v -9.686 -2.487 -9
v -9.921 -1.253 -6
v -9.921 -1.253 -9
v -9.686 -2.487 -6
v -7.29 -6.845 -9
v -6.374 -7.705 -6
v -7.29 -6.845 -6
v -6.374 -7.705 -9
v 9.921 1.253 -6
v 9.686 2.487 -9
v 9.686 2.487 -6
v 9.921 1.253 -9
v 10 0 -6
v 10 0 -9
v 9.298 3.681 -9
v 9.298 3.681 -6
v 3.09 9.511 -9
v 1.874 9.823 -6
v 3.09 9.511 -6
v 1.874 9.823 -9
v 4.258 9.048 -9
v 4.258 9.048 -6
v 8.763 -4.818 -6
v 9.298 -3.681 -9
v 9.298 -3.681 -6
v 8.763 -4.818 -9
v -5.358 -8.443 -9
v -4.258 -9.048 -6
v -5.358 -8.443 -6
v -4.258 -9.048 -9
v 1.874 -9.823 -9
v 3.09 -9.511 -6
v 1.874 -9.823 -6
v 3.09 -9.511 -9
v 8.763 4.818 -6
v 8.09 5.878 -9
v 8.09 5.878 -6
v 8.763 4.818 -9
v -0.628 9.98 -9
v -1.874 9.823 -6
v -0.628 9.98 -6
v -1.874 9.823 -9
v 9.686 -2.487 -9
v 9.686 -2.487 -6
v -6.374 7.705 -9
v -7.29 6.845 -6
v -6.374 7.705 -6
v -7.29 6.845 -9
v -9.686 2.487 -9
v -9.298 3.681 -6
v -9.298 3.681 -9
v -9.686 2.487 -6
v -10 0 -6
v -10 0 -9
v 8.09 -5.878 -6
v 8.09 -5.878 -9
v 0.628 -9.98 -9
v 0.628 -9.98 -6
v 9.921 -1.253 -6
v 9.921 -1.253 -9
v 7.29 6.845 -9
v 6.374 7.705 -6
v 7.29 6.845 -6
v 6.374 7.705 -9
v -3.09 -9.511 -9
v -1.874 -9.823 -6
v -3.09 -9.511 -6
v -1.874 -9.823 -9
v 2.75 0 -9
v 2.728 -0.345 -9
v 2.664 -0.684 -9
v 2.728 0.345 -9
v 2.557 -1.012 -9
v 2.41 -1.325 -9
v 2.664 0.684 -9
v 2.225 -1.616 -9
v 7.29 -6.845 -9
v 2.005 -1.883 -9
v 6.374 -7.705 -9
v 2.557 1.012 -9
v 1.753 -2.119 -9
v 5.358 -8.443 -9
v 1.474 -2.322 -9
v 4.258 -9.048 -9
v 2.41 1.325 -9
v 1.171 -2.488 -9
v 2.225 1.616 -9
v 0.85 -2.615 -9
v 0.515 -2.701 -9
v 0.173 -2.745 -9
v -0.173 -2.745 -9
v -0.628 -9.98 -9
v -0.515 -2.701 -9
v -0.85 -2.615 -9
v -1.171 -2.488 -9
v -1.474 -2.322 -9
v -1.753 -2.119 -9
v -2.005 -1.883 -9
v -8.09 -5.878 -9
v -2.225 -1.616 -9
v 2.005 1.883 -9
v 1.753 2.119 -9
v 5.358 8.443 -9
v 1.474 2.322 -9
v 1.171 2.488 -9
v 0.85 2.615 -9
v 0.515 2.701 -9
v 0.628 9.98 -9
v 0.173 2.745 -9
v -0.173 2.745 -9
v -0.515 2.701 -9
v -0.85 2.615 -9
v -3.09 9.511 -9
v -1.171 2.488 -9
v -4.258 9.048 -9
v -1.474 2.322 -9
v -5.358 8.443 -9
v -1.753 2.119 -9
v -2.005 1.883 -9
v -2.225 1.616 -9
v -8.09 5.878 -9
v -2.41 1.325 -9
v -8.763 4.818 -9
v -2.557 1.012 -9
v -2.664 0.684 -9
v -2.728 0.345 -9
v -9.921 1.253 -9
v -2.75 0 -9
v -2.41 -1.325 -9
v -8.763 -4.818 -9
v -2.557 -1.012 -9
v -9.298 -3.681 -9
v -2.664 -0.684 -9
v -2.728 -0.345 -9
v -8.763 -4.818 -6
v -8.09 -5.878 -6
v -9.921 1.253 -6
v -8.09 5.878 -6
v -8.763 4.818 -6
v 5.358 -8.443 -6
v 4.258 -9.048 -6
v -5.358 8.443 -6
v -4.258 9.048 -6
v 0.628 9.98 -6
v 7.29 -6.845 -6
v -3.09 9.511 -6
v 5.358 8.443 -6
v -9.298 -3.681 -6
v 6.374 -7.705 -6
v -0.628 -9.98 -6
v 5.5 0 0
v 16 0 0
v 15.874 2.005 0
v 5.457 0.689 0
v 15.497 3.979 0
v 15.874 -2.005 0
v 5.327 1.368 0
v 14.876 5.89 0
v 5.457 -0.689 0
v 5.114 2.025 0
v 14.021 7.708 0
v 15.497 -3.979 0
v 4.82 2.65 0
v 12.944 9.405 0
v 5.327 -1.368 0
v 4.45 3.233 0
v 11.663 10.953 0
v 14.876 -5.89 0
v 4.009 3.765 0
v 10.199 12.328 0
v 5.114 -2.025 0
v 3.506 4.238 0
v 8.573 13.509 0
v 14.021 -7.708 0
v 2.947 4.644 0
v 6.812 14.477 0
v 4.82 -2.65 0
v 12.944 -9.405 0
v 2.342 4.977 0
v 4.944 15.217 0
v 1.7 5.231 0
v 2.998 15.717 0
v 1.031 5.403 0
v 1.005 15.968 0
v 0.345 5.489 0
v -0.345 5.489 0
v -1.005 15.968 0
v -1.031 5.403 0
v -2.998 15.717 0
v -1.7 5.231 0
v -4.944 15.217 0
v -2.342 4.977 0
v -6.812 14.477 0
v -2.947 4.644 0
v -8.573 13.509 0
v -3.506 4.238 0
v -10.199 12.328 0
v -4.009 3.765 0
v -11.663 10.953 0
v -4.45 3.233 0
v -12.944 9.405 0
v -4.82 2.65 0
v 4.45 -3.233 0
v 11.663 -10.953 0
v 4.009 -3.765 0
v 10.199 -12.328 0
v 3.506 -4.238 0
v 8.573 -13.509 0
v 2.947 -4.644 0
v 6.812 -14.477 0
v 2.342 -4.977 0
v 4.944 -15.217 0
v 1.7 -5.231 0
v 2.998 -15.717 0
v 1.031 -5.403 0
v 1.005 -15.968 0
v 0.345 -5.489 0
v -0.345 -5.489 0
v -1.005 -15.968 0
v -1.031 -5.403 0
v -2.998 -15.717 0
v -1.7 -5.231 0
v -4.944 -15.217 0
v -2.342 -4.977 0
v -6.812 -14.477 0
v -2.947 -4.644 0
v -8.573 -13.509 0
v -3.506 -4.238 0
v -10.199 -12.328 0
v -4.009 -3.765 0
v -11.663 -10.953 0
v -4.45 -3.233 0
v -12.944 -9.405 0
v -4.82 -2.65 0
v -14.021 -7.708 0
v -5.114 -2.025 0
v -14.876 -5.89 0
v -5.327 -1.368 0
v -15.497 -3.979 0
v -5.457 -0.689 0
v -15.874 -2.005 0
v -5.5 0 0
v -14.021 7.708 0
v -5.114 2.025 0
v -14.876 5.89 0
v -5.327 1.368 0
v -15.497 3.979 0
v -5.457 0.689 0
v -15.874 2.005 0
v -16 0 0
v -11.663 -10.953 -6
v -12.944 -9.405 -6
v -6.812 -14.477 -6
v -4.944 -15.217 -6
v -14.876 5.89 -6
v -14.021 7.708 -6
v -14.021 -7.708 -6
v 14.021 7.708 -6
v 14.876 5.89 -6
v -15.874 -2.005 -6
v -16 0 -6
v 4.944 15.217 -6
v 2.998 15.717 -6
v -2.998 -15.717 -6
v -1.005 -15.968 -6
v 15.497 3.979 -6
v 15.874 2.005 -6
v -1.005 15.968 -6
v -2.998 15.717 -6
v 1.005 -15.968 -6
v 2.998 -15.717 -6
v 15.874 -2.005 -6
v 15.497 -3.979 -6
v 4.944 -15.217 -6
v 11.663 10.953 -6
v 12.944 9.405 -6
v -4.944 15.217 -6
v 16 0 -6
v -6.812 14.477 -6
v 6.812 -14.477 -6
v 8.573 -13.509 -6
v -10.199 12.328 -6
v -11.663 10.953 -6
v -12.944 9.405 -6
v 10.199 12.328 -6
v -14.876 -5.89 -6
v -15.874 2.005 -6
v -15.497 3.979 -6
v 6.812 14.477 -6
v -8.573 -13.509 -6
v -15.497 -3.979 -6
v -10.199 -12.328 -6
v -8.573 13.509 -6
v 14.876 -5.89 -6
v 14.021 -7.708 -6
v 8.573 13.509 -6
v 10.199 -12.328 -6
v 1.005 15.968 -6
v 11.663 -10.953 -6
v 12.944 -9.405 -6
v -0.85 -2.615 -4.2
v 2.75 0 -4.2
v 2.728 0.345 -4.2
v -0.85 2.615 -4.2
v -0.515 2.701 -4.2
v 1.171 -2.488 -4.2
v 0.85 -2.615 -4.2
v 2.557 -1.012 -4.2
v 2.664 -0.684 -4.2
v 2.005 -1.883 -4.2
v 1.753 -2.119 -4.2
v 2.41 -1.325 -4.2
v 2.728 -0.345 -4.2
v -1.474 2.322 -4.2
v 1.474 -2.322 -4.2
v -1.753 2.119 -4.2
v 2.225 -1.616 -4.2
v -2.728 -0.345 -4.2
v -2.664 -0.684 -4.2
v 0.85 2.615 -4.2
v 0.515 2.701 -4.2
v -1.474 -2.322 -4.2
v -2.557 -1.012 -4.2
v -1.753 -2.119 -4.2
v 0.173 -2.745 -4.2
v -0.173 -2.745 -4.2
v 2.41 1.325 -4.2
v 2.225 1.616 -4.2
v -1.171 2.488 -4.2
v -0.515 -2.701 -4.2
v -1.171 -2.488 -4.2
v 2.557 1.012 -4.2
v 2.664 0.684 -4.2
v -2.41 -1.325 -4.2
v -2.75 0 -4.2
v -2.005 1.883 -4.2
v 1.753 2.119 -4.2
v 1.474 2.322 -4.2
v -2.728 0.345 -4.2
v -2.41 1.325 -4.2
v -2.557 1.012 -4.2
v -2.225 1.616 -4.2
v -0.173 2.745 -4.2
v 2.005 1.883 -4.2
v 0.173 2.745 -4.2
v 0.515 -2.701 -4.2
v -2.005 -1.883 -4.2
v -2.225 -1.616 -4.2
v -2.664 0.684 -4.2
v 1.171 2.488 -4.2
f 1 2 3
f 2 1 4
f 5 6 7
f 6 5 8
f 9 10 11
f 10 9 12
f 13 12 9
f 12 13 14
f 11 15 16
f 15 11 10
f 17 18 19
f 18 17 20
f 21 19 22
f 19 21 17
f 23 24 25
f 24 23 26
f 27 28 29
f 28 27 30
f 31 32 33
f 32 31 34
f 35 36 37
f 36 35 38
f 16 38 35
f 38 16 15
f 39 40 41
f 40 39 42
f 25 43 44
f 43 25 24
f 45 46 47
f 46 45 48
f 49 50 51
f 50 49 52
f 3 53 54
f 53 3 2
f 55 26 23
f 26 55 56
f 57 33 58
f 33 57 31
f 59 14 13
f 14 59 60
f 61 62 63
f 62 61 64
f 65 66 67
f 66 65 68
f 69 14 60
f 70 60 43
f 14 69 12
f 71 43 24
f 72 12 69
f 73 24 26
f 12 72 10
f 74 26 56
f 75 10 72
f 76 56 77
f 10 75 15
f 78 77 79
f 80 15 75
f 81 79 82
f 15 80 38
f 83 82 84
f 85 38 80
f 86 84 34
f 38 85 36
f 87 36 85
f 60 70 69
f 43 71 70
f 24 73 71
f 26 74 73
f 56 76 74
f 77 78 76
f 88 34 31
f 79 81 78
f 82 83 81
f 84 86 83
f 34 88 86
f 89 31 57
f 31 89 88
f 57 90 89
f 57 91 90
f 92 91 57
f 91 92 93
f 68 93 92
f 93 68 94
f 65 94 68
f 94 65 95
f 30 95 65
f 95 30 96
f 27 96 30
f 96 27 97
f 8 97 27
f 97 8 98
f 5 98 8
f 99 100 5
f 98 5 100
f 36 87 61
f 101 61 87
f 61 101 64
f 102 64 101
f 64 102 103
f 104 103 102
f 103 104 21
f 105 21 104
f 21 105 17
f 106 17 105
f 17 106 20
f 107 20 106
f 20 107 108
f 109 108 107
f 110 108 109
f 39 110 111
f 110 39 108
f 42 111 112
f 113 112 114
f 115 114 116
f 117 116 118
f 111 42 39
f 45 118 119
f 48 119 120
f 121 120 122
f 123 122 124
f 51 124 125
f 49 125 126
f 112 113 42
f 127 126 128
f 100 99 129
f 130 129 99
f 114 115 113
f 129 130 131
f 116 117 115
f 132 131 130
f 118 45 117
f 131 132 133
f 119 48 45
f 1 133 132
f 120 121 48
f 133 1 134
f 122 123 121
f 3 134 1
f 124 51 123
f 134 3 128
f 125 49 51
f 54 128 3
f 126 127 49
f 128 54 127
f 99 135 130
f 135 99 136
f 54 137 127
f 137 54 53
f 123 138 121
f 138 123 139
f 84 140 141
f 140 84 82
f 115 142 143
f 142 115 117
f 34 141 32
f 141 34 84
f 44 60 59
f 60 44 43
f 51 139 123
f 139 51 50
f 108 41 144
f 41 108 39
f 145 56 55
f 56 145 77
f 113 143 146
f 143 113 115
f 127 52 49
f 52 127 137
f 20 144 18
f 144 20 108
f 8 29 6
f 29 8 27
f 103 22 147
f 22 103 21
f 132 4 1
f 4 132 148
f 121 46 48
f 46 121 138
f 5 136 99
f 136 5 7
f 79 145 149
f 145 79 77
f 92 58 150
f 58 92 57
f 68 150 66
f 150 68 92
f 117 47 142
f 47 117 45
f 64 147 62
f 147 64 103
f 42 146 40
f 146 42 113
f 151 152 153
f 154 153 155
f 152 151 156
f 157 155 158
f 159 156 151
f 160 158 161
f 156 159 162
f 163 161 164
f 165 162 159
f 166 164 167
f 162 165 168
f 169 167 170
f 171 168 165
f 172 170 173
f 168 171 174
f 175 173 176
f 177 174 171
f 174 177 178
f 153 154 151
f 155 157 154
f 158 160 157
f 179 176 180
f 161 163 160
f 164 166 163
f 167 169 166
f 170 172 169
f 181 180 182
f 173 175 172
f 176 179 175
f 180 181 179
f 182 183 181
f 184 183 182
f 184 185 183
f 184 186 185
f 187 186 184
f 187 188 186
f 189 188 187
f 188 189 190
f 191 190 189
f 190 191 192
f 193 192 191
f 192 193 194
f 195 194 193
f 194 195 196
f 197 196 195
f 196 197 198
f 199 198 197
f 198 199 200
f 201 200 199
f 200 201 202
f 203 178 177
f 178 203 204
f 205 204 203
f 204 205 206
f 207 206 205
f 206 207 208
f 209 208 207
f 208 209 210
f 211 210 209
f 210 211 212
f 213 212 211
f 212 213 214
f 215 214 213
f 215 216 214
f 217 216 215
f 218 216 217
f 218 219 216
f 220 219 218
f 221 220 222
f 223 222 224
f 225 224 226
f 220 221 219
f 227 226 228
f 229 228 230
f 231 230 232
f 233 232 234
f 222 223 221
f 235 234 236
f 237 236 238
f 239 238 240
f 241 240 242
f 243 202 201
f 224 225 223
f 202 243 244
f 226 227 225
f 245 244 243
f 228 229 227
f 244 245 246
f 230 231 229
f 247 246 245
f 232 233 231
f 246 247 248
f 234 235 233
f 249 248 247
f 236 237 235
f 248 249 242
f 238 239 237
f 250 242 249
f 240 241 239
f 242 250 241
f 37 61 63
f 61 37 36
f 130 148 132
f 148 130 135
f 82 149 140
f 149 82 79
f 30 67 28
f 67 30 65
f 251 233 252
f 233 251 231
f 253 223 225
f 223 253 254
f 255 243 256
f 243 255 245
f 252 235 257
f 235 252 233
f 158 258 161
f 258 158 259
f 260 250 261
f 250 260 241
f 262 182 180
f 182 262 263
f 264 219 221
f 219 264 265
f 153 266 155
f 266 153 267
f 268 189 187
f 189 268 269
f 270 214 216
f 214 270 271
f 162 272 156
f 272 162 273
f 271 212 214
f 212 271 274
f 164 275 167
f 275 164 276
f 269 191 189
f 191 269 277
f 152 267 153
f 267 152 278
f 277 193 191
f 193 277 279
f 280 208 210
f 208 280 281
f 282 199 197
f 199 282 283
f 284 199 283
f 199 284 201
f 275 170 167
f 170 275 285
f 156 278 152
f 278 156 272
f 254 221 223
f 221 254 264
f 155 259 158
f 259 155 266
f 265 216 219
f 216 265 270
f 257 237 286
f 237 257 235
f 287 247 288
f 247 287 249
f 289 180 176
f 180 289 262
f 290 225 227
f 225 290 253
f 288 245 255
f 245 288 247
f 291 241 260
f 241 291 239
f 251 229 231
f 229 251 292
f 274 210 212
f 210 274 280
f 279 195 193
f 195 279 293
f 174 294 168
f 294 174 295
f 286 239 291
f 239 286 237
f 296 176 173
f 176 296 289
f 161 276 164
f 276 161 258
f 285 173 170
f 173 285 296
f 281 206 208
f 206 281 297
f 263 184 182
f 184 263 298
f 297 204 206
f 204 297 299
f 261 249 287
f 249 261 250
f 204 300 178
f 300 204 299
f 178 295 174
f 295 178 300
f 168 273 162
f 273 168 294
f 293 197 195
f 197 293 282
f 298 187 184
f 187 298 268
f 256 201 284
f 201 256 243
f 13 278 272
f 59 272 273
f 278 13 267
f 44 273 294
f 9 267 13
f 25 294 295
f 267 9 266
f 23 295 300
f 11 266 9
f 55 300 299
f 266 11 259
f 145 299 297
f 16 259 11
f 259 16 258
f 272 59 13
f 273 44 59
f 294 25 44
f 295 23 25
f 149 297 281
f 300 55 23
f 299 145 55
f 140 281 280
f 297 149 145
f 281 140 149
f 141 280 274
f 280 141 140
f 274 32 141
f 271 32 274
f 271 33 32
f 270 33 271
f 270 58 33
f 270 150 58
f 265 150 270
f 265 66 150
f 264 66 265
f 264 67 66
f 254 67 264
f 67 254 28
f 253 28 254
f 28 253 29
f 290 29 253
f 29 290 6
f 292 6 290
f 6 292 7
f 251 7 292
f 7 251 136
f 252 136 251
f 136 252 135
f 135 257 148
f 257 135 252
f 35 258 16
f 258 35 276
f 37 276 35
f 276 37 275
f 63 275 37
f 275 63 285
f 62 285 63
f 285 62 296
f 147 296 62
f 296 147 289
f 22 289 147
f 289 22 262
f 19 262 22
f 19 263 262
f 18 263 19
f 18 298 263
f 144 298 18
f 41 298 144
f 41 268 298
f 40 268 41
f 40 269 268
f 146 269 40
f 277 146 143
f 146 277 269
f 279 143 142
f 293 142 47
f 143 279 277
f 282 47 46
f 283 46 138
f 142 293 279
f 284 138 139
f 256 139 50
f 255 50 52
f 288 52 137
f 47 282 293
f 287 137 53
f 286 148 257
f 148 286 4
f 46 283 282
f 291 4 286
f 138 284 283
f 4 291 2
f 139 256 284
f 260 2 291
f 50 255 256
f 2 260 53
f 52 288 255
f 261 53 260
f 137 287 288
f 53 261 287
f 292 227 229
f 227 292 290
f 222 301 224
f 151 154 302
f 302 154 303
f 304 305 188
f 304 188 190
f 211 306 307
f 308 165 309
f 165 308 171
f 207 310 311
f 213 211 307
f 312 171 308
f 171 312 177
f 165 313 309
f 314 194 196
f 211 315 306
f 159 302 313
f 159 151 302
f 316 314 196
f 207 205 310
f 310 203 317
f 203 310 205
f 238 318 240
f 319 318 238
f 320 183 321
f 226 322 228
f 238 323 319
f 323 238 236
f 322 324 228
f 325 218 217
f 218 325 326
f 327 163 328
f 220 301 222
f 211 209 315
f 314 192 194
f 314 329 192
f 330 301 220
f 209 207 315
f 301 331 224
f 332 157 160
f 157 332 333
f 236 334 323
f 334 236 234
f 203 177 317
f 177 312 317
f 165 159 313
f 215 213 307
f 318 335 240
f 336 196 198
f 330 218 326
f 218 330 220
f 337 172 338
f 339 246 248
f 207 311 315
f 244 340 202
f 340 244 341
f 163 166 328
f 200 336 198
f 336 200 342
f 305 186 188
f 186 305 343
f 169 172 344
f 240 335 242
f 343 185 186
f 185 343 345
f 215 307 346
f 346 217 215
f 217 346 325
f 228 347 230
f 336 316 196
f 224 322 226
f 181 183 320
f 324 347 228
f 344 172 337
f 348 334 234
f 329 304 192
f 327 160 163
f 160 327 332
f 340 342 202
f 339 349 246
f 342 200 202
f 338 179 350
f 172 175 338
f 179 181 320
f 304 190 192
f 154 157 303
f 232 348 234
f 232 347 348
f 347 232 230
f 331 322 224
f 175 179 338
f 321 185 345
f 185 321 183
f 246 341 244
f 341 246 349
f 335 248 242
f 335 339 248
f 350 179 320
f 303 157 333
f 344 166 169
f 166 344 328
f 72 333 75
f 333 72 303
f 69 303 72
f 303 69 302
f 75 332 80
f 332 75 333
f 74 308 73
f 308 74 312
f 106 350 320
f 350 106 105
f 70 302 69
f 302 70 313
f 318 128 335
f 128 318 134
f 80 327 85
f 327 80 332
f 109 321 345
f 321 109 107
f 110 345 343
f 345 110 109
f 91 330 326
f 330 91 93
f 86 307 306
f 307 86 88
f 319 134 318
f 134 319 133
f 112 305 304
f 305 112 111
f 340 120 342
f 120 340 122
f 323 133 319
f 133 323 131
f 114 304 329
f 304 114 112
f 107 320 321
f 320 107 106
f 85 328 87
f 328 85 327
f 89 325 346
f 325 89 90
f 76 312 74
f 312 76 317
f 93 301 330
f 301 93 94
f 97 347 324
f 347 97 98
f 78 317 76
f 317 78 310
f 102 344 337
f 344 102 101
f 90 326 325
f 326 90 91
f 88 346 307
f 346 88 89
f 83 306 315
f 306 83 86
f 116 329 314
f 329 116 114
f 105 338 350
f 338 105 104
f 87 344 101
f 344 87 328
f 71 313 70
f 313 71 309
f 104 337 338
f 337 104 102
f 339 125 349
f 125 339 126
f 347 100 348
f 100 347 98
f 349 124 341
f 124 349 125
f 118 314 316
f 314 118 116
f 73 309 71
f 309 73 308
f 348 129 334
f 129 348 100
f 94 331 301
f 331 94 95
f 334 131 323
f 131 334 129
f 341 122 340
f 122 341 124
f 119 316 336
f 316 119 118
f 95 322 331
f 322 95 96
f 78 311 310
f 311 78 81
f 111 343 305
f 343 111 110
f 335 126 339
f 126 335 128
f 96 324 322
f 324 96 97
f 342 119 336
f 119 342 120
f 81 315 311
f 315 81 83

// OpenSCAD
$fn = 50;


difference() {
	union() {
		translate(v = [0, 0, -9.0000000000]) {
			cylinder(h = 9, r = 10.0000000000);
		}
		translate(v = [0, 0, -6.0000000000]) {
			cylinder(h = 6, r = 16.0000000000);
		}
	}
	union() {
		translate(v = [0, 0, 0]) {
			rotate(a = [0, 0, 0]) {
				difference() {
					union() {
						#translate(v = [0, 0, -9.0000000000]) {
							cylinder(h = 9, r = 2.2500000000);
						}
						#translate(v = [0, 0, -4.2000000000]) {
							cylinder(h = 4.2000000000, r1 = 2.7500000000, r2 = 5.5000000000);
						}
						#translate(v = [0, 0, -9.0000000000]) {
							cylinder(h = 9, r = 2.7500000000);
						}
						#translate(v = [0, 0, -9.0000000000]) {
							cylinder(h = 9, r = 2.2500000000);
						}
					}
					union();
				}
			}
		}
	}
}
